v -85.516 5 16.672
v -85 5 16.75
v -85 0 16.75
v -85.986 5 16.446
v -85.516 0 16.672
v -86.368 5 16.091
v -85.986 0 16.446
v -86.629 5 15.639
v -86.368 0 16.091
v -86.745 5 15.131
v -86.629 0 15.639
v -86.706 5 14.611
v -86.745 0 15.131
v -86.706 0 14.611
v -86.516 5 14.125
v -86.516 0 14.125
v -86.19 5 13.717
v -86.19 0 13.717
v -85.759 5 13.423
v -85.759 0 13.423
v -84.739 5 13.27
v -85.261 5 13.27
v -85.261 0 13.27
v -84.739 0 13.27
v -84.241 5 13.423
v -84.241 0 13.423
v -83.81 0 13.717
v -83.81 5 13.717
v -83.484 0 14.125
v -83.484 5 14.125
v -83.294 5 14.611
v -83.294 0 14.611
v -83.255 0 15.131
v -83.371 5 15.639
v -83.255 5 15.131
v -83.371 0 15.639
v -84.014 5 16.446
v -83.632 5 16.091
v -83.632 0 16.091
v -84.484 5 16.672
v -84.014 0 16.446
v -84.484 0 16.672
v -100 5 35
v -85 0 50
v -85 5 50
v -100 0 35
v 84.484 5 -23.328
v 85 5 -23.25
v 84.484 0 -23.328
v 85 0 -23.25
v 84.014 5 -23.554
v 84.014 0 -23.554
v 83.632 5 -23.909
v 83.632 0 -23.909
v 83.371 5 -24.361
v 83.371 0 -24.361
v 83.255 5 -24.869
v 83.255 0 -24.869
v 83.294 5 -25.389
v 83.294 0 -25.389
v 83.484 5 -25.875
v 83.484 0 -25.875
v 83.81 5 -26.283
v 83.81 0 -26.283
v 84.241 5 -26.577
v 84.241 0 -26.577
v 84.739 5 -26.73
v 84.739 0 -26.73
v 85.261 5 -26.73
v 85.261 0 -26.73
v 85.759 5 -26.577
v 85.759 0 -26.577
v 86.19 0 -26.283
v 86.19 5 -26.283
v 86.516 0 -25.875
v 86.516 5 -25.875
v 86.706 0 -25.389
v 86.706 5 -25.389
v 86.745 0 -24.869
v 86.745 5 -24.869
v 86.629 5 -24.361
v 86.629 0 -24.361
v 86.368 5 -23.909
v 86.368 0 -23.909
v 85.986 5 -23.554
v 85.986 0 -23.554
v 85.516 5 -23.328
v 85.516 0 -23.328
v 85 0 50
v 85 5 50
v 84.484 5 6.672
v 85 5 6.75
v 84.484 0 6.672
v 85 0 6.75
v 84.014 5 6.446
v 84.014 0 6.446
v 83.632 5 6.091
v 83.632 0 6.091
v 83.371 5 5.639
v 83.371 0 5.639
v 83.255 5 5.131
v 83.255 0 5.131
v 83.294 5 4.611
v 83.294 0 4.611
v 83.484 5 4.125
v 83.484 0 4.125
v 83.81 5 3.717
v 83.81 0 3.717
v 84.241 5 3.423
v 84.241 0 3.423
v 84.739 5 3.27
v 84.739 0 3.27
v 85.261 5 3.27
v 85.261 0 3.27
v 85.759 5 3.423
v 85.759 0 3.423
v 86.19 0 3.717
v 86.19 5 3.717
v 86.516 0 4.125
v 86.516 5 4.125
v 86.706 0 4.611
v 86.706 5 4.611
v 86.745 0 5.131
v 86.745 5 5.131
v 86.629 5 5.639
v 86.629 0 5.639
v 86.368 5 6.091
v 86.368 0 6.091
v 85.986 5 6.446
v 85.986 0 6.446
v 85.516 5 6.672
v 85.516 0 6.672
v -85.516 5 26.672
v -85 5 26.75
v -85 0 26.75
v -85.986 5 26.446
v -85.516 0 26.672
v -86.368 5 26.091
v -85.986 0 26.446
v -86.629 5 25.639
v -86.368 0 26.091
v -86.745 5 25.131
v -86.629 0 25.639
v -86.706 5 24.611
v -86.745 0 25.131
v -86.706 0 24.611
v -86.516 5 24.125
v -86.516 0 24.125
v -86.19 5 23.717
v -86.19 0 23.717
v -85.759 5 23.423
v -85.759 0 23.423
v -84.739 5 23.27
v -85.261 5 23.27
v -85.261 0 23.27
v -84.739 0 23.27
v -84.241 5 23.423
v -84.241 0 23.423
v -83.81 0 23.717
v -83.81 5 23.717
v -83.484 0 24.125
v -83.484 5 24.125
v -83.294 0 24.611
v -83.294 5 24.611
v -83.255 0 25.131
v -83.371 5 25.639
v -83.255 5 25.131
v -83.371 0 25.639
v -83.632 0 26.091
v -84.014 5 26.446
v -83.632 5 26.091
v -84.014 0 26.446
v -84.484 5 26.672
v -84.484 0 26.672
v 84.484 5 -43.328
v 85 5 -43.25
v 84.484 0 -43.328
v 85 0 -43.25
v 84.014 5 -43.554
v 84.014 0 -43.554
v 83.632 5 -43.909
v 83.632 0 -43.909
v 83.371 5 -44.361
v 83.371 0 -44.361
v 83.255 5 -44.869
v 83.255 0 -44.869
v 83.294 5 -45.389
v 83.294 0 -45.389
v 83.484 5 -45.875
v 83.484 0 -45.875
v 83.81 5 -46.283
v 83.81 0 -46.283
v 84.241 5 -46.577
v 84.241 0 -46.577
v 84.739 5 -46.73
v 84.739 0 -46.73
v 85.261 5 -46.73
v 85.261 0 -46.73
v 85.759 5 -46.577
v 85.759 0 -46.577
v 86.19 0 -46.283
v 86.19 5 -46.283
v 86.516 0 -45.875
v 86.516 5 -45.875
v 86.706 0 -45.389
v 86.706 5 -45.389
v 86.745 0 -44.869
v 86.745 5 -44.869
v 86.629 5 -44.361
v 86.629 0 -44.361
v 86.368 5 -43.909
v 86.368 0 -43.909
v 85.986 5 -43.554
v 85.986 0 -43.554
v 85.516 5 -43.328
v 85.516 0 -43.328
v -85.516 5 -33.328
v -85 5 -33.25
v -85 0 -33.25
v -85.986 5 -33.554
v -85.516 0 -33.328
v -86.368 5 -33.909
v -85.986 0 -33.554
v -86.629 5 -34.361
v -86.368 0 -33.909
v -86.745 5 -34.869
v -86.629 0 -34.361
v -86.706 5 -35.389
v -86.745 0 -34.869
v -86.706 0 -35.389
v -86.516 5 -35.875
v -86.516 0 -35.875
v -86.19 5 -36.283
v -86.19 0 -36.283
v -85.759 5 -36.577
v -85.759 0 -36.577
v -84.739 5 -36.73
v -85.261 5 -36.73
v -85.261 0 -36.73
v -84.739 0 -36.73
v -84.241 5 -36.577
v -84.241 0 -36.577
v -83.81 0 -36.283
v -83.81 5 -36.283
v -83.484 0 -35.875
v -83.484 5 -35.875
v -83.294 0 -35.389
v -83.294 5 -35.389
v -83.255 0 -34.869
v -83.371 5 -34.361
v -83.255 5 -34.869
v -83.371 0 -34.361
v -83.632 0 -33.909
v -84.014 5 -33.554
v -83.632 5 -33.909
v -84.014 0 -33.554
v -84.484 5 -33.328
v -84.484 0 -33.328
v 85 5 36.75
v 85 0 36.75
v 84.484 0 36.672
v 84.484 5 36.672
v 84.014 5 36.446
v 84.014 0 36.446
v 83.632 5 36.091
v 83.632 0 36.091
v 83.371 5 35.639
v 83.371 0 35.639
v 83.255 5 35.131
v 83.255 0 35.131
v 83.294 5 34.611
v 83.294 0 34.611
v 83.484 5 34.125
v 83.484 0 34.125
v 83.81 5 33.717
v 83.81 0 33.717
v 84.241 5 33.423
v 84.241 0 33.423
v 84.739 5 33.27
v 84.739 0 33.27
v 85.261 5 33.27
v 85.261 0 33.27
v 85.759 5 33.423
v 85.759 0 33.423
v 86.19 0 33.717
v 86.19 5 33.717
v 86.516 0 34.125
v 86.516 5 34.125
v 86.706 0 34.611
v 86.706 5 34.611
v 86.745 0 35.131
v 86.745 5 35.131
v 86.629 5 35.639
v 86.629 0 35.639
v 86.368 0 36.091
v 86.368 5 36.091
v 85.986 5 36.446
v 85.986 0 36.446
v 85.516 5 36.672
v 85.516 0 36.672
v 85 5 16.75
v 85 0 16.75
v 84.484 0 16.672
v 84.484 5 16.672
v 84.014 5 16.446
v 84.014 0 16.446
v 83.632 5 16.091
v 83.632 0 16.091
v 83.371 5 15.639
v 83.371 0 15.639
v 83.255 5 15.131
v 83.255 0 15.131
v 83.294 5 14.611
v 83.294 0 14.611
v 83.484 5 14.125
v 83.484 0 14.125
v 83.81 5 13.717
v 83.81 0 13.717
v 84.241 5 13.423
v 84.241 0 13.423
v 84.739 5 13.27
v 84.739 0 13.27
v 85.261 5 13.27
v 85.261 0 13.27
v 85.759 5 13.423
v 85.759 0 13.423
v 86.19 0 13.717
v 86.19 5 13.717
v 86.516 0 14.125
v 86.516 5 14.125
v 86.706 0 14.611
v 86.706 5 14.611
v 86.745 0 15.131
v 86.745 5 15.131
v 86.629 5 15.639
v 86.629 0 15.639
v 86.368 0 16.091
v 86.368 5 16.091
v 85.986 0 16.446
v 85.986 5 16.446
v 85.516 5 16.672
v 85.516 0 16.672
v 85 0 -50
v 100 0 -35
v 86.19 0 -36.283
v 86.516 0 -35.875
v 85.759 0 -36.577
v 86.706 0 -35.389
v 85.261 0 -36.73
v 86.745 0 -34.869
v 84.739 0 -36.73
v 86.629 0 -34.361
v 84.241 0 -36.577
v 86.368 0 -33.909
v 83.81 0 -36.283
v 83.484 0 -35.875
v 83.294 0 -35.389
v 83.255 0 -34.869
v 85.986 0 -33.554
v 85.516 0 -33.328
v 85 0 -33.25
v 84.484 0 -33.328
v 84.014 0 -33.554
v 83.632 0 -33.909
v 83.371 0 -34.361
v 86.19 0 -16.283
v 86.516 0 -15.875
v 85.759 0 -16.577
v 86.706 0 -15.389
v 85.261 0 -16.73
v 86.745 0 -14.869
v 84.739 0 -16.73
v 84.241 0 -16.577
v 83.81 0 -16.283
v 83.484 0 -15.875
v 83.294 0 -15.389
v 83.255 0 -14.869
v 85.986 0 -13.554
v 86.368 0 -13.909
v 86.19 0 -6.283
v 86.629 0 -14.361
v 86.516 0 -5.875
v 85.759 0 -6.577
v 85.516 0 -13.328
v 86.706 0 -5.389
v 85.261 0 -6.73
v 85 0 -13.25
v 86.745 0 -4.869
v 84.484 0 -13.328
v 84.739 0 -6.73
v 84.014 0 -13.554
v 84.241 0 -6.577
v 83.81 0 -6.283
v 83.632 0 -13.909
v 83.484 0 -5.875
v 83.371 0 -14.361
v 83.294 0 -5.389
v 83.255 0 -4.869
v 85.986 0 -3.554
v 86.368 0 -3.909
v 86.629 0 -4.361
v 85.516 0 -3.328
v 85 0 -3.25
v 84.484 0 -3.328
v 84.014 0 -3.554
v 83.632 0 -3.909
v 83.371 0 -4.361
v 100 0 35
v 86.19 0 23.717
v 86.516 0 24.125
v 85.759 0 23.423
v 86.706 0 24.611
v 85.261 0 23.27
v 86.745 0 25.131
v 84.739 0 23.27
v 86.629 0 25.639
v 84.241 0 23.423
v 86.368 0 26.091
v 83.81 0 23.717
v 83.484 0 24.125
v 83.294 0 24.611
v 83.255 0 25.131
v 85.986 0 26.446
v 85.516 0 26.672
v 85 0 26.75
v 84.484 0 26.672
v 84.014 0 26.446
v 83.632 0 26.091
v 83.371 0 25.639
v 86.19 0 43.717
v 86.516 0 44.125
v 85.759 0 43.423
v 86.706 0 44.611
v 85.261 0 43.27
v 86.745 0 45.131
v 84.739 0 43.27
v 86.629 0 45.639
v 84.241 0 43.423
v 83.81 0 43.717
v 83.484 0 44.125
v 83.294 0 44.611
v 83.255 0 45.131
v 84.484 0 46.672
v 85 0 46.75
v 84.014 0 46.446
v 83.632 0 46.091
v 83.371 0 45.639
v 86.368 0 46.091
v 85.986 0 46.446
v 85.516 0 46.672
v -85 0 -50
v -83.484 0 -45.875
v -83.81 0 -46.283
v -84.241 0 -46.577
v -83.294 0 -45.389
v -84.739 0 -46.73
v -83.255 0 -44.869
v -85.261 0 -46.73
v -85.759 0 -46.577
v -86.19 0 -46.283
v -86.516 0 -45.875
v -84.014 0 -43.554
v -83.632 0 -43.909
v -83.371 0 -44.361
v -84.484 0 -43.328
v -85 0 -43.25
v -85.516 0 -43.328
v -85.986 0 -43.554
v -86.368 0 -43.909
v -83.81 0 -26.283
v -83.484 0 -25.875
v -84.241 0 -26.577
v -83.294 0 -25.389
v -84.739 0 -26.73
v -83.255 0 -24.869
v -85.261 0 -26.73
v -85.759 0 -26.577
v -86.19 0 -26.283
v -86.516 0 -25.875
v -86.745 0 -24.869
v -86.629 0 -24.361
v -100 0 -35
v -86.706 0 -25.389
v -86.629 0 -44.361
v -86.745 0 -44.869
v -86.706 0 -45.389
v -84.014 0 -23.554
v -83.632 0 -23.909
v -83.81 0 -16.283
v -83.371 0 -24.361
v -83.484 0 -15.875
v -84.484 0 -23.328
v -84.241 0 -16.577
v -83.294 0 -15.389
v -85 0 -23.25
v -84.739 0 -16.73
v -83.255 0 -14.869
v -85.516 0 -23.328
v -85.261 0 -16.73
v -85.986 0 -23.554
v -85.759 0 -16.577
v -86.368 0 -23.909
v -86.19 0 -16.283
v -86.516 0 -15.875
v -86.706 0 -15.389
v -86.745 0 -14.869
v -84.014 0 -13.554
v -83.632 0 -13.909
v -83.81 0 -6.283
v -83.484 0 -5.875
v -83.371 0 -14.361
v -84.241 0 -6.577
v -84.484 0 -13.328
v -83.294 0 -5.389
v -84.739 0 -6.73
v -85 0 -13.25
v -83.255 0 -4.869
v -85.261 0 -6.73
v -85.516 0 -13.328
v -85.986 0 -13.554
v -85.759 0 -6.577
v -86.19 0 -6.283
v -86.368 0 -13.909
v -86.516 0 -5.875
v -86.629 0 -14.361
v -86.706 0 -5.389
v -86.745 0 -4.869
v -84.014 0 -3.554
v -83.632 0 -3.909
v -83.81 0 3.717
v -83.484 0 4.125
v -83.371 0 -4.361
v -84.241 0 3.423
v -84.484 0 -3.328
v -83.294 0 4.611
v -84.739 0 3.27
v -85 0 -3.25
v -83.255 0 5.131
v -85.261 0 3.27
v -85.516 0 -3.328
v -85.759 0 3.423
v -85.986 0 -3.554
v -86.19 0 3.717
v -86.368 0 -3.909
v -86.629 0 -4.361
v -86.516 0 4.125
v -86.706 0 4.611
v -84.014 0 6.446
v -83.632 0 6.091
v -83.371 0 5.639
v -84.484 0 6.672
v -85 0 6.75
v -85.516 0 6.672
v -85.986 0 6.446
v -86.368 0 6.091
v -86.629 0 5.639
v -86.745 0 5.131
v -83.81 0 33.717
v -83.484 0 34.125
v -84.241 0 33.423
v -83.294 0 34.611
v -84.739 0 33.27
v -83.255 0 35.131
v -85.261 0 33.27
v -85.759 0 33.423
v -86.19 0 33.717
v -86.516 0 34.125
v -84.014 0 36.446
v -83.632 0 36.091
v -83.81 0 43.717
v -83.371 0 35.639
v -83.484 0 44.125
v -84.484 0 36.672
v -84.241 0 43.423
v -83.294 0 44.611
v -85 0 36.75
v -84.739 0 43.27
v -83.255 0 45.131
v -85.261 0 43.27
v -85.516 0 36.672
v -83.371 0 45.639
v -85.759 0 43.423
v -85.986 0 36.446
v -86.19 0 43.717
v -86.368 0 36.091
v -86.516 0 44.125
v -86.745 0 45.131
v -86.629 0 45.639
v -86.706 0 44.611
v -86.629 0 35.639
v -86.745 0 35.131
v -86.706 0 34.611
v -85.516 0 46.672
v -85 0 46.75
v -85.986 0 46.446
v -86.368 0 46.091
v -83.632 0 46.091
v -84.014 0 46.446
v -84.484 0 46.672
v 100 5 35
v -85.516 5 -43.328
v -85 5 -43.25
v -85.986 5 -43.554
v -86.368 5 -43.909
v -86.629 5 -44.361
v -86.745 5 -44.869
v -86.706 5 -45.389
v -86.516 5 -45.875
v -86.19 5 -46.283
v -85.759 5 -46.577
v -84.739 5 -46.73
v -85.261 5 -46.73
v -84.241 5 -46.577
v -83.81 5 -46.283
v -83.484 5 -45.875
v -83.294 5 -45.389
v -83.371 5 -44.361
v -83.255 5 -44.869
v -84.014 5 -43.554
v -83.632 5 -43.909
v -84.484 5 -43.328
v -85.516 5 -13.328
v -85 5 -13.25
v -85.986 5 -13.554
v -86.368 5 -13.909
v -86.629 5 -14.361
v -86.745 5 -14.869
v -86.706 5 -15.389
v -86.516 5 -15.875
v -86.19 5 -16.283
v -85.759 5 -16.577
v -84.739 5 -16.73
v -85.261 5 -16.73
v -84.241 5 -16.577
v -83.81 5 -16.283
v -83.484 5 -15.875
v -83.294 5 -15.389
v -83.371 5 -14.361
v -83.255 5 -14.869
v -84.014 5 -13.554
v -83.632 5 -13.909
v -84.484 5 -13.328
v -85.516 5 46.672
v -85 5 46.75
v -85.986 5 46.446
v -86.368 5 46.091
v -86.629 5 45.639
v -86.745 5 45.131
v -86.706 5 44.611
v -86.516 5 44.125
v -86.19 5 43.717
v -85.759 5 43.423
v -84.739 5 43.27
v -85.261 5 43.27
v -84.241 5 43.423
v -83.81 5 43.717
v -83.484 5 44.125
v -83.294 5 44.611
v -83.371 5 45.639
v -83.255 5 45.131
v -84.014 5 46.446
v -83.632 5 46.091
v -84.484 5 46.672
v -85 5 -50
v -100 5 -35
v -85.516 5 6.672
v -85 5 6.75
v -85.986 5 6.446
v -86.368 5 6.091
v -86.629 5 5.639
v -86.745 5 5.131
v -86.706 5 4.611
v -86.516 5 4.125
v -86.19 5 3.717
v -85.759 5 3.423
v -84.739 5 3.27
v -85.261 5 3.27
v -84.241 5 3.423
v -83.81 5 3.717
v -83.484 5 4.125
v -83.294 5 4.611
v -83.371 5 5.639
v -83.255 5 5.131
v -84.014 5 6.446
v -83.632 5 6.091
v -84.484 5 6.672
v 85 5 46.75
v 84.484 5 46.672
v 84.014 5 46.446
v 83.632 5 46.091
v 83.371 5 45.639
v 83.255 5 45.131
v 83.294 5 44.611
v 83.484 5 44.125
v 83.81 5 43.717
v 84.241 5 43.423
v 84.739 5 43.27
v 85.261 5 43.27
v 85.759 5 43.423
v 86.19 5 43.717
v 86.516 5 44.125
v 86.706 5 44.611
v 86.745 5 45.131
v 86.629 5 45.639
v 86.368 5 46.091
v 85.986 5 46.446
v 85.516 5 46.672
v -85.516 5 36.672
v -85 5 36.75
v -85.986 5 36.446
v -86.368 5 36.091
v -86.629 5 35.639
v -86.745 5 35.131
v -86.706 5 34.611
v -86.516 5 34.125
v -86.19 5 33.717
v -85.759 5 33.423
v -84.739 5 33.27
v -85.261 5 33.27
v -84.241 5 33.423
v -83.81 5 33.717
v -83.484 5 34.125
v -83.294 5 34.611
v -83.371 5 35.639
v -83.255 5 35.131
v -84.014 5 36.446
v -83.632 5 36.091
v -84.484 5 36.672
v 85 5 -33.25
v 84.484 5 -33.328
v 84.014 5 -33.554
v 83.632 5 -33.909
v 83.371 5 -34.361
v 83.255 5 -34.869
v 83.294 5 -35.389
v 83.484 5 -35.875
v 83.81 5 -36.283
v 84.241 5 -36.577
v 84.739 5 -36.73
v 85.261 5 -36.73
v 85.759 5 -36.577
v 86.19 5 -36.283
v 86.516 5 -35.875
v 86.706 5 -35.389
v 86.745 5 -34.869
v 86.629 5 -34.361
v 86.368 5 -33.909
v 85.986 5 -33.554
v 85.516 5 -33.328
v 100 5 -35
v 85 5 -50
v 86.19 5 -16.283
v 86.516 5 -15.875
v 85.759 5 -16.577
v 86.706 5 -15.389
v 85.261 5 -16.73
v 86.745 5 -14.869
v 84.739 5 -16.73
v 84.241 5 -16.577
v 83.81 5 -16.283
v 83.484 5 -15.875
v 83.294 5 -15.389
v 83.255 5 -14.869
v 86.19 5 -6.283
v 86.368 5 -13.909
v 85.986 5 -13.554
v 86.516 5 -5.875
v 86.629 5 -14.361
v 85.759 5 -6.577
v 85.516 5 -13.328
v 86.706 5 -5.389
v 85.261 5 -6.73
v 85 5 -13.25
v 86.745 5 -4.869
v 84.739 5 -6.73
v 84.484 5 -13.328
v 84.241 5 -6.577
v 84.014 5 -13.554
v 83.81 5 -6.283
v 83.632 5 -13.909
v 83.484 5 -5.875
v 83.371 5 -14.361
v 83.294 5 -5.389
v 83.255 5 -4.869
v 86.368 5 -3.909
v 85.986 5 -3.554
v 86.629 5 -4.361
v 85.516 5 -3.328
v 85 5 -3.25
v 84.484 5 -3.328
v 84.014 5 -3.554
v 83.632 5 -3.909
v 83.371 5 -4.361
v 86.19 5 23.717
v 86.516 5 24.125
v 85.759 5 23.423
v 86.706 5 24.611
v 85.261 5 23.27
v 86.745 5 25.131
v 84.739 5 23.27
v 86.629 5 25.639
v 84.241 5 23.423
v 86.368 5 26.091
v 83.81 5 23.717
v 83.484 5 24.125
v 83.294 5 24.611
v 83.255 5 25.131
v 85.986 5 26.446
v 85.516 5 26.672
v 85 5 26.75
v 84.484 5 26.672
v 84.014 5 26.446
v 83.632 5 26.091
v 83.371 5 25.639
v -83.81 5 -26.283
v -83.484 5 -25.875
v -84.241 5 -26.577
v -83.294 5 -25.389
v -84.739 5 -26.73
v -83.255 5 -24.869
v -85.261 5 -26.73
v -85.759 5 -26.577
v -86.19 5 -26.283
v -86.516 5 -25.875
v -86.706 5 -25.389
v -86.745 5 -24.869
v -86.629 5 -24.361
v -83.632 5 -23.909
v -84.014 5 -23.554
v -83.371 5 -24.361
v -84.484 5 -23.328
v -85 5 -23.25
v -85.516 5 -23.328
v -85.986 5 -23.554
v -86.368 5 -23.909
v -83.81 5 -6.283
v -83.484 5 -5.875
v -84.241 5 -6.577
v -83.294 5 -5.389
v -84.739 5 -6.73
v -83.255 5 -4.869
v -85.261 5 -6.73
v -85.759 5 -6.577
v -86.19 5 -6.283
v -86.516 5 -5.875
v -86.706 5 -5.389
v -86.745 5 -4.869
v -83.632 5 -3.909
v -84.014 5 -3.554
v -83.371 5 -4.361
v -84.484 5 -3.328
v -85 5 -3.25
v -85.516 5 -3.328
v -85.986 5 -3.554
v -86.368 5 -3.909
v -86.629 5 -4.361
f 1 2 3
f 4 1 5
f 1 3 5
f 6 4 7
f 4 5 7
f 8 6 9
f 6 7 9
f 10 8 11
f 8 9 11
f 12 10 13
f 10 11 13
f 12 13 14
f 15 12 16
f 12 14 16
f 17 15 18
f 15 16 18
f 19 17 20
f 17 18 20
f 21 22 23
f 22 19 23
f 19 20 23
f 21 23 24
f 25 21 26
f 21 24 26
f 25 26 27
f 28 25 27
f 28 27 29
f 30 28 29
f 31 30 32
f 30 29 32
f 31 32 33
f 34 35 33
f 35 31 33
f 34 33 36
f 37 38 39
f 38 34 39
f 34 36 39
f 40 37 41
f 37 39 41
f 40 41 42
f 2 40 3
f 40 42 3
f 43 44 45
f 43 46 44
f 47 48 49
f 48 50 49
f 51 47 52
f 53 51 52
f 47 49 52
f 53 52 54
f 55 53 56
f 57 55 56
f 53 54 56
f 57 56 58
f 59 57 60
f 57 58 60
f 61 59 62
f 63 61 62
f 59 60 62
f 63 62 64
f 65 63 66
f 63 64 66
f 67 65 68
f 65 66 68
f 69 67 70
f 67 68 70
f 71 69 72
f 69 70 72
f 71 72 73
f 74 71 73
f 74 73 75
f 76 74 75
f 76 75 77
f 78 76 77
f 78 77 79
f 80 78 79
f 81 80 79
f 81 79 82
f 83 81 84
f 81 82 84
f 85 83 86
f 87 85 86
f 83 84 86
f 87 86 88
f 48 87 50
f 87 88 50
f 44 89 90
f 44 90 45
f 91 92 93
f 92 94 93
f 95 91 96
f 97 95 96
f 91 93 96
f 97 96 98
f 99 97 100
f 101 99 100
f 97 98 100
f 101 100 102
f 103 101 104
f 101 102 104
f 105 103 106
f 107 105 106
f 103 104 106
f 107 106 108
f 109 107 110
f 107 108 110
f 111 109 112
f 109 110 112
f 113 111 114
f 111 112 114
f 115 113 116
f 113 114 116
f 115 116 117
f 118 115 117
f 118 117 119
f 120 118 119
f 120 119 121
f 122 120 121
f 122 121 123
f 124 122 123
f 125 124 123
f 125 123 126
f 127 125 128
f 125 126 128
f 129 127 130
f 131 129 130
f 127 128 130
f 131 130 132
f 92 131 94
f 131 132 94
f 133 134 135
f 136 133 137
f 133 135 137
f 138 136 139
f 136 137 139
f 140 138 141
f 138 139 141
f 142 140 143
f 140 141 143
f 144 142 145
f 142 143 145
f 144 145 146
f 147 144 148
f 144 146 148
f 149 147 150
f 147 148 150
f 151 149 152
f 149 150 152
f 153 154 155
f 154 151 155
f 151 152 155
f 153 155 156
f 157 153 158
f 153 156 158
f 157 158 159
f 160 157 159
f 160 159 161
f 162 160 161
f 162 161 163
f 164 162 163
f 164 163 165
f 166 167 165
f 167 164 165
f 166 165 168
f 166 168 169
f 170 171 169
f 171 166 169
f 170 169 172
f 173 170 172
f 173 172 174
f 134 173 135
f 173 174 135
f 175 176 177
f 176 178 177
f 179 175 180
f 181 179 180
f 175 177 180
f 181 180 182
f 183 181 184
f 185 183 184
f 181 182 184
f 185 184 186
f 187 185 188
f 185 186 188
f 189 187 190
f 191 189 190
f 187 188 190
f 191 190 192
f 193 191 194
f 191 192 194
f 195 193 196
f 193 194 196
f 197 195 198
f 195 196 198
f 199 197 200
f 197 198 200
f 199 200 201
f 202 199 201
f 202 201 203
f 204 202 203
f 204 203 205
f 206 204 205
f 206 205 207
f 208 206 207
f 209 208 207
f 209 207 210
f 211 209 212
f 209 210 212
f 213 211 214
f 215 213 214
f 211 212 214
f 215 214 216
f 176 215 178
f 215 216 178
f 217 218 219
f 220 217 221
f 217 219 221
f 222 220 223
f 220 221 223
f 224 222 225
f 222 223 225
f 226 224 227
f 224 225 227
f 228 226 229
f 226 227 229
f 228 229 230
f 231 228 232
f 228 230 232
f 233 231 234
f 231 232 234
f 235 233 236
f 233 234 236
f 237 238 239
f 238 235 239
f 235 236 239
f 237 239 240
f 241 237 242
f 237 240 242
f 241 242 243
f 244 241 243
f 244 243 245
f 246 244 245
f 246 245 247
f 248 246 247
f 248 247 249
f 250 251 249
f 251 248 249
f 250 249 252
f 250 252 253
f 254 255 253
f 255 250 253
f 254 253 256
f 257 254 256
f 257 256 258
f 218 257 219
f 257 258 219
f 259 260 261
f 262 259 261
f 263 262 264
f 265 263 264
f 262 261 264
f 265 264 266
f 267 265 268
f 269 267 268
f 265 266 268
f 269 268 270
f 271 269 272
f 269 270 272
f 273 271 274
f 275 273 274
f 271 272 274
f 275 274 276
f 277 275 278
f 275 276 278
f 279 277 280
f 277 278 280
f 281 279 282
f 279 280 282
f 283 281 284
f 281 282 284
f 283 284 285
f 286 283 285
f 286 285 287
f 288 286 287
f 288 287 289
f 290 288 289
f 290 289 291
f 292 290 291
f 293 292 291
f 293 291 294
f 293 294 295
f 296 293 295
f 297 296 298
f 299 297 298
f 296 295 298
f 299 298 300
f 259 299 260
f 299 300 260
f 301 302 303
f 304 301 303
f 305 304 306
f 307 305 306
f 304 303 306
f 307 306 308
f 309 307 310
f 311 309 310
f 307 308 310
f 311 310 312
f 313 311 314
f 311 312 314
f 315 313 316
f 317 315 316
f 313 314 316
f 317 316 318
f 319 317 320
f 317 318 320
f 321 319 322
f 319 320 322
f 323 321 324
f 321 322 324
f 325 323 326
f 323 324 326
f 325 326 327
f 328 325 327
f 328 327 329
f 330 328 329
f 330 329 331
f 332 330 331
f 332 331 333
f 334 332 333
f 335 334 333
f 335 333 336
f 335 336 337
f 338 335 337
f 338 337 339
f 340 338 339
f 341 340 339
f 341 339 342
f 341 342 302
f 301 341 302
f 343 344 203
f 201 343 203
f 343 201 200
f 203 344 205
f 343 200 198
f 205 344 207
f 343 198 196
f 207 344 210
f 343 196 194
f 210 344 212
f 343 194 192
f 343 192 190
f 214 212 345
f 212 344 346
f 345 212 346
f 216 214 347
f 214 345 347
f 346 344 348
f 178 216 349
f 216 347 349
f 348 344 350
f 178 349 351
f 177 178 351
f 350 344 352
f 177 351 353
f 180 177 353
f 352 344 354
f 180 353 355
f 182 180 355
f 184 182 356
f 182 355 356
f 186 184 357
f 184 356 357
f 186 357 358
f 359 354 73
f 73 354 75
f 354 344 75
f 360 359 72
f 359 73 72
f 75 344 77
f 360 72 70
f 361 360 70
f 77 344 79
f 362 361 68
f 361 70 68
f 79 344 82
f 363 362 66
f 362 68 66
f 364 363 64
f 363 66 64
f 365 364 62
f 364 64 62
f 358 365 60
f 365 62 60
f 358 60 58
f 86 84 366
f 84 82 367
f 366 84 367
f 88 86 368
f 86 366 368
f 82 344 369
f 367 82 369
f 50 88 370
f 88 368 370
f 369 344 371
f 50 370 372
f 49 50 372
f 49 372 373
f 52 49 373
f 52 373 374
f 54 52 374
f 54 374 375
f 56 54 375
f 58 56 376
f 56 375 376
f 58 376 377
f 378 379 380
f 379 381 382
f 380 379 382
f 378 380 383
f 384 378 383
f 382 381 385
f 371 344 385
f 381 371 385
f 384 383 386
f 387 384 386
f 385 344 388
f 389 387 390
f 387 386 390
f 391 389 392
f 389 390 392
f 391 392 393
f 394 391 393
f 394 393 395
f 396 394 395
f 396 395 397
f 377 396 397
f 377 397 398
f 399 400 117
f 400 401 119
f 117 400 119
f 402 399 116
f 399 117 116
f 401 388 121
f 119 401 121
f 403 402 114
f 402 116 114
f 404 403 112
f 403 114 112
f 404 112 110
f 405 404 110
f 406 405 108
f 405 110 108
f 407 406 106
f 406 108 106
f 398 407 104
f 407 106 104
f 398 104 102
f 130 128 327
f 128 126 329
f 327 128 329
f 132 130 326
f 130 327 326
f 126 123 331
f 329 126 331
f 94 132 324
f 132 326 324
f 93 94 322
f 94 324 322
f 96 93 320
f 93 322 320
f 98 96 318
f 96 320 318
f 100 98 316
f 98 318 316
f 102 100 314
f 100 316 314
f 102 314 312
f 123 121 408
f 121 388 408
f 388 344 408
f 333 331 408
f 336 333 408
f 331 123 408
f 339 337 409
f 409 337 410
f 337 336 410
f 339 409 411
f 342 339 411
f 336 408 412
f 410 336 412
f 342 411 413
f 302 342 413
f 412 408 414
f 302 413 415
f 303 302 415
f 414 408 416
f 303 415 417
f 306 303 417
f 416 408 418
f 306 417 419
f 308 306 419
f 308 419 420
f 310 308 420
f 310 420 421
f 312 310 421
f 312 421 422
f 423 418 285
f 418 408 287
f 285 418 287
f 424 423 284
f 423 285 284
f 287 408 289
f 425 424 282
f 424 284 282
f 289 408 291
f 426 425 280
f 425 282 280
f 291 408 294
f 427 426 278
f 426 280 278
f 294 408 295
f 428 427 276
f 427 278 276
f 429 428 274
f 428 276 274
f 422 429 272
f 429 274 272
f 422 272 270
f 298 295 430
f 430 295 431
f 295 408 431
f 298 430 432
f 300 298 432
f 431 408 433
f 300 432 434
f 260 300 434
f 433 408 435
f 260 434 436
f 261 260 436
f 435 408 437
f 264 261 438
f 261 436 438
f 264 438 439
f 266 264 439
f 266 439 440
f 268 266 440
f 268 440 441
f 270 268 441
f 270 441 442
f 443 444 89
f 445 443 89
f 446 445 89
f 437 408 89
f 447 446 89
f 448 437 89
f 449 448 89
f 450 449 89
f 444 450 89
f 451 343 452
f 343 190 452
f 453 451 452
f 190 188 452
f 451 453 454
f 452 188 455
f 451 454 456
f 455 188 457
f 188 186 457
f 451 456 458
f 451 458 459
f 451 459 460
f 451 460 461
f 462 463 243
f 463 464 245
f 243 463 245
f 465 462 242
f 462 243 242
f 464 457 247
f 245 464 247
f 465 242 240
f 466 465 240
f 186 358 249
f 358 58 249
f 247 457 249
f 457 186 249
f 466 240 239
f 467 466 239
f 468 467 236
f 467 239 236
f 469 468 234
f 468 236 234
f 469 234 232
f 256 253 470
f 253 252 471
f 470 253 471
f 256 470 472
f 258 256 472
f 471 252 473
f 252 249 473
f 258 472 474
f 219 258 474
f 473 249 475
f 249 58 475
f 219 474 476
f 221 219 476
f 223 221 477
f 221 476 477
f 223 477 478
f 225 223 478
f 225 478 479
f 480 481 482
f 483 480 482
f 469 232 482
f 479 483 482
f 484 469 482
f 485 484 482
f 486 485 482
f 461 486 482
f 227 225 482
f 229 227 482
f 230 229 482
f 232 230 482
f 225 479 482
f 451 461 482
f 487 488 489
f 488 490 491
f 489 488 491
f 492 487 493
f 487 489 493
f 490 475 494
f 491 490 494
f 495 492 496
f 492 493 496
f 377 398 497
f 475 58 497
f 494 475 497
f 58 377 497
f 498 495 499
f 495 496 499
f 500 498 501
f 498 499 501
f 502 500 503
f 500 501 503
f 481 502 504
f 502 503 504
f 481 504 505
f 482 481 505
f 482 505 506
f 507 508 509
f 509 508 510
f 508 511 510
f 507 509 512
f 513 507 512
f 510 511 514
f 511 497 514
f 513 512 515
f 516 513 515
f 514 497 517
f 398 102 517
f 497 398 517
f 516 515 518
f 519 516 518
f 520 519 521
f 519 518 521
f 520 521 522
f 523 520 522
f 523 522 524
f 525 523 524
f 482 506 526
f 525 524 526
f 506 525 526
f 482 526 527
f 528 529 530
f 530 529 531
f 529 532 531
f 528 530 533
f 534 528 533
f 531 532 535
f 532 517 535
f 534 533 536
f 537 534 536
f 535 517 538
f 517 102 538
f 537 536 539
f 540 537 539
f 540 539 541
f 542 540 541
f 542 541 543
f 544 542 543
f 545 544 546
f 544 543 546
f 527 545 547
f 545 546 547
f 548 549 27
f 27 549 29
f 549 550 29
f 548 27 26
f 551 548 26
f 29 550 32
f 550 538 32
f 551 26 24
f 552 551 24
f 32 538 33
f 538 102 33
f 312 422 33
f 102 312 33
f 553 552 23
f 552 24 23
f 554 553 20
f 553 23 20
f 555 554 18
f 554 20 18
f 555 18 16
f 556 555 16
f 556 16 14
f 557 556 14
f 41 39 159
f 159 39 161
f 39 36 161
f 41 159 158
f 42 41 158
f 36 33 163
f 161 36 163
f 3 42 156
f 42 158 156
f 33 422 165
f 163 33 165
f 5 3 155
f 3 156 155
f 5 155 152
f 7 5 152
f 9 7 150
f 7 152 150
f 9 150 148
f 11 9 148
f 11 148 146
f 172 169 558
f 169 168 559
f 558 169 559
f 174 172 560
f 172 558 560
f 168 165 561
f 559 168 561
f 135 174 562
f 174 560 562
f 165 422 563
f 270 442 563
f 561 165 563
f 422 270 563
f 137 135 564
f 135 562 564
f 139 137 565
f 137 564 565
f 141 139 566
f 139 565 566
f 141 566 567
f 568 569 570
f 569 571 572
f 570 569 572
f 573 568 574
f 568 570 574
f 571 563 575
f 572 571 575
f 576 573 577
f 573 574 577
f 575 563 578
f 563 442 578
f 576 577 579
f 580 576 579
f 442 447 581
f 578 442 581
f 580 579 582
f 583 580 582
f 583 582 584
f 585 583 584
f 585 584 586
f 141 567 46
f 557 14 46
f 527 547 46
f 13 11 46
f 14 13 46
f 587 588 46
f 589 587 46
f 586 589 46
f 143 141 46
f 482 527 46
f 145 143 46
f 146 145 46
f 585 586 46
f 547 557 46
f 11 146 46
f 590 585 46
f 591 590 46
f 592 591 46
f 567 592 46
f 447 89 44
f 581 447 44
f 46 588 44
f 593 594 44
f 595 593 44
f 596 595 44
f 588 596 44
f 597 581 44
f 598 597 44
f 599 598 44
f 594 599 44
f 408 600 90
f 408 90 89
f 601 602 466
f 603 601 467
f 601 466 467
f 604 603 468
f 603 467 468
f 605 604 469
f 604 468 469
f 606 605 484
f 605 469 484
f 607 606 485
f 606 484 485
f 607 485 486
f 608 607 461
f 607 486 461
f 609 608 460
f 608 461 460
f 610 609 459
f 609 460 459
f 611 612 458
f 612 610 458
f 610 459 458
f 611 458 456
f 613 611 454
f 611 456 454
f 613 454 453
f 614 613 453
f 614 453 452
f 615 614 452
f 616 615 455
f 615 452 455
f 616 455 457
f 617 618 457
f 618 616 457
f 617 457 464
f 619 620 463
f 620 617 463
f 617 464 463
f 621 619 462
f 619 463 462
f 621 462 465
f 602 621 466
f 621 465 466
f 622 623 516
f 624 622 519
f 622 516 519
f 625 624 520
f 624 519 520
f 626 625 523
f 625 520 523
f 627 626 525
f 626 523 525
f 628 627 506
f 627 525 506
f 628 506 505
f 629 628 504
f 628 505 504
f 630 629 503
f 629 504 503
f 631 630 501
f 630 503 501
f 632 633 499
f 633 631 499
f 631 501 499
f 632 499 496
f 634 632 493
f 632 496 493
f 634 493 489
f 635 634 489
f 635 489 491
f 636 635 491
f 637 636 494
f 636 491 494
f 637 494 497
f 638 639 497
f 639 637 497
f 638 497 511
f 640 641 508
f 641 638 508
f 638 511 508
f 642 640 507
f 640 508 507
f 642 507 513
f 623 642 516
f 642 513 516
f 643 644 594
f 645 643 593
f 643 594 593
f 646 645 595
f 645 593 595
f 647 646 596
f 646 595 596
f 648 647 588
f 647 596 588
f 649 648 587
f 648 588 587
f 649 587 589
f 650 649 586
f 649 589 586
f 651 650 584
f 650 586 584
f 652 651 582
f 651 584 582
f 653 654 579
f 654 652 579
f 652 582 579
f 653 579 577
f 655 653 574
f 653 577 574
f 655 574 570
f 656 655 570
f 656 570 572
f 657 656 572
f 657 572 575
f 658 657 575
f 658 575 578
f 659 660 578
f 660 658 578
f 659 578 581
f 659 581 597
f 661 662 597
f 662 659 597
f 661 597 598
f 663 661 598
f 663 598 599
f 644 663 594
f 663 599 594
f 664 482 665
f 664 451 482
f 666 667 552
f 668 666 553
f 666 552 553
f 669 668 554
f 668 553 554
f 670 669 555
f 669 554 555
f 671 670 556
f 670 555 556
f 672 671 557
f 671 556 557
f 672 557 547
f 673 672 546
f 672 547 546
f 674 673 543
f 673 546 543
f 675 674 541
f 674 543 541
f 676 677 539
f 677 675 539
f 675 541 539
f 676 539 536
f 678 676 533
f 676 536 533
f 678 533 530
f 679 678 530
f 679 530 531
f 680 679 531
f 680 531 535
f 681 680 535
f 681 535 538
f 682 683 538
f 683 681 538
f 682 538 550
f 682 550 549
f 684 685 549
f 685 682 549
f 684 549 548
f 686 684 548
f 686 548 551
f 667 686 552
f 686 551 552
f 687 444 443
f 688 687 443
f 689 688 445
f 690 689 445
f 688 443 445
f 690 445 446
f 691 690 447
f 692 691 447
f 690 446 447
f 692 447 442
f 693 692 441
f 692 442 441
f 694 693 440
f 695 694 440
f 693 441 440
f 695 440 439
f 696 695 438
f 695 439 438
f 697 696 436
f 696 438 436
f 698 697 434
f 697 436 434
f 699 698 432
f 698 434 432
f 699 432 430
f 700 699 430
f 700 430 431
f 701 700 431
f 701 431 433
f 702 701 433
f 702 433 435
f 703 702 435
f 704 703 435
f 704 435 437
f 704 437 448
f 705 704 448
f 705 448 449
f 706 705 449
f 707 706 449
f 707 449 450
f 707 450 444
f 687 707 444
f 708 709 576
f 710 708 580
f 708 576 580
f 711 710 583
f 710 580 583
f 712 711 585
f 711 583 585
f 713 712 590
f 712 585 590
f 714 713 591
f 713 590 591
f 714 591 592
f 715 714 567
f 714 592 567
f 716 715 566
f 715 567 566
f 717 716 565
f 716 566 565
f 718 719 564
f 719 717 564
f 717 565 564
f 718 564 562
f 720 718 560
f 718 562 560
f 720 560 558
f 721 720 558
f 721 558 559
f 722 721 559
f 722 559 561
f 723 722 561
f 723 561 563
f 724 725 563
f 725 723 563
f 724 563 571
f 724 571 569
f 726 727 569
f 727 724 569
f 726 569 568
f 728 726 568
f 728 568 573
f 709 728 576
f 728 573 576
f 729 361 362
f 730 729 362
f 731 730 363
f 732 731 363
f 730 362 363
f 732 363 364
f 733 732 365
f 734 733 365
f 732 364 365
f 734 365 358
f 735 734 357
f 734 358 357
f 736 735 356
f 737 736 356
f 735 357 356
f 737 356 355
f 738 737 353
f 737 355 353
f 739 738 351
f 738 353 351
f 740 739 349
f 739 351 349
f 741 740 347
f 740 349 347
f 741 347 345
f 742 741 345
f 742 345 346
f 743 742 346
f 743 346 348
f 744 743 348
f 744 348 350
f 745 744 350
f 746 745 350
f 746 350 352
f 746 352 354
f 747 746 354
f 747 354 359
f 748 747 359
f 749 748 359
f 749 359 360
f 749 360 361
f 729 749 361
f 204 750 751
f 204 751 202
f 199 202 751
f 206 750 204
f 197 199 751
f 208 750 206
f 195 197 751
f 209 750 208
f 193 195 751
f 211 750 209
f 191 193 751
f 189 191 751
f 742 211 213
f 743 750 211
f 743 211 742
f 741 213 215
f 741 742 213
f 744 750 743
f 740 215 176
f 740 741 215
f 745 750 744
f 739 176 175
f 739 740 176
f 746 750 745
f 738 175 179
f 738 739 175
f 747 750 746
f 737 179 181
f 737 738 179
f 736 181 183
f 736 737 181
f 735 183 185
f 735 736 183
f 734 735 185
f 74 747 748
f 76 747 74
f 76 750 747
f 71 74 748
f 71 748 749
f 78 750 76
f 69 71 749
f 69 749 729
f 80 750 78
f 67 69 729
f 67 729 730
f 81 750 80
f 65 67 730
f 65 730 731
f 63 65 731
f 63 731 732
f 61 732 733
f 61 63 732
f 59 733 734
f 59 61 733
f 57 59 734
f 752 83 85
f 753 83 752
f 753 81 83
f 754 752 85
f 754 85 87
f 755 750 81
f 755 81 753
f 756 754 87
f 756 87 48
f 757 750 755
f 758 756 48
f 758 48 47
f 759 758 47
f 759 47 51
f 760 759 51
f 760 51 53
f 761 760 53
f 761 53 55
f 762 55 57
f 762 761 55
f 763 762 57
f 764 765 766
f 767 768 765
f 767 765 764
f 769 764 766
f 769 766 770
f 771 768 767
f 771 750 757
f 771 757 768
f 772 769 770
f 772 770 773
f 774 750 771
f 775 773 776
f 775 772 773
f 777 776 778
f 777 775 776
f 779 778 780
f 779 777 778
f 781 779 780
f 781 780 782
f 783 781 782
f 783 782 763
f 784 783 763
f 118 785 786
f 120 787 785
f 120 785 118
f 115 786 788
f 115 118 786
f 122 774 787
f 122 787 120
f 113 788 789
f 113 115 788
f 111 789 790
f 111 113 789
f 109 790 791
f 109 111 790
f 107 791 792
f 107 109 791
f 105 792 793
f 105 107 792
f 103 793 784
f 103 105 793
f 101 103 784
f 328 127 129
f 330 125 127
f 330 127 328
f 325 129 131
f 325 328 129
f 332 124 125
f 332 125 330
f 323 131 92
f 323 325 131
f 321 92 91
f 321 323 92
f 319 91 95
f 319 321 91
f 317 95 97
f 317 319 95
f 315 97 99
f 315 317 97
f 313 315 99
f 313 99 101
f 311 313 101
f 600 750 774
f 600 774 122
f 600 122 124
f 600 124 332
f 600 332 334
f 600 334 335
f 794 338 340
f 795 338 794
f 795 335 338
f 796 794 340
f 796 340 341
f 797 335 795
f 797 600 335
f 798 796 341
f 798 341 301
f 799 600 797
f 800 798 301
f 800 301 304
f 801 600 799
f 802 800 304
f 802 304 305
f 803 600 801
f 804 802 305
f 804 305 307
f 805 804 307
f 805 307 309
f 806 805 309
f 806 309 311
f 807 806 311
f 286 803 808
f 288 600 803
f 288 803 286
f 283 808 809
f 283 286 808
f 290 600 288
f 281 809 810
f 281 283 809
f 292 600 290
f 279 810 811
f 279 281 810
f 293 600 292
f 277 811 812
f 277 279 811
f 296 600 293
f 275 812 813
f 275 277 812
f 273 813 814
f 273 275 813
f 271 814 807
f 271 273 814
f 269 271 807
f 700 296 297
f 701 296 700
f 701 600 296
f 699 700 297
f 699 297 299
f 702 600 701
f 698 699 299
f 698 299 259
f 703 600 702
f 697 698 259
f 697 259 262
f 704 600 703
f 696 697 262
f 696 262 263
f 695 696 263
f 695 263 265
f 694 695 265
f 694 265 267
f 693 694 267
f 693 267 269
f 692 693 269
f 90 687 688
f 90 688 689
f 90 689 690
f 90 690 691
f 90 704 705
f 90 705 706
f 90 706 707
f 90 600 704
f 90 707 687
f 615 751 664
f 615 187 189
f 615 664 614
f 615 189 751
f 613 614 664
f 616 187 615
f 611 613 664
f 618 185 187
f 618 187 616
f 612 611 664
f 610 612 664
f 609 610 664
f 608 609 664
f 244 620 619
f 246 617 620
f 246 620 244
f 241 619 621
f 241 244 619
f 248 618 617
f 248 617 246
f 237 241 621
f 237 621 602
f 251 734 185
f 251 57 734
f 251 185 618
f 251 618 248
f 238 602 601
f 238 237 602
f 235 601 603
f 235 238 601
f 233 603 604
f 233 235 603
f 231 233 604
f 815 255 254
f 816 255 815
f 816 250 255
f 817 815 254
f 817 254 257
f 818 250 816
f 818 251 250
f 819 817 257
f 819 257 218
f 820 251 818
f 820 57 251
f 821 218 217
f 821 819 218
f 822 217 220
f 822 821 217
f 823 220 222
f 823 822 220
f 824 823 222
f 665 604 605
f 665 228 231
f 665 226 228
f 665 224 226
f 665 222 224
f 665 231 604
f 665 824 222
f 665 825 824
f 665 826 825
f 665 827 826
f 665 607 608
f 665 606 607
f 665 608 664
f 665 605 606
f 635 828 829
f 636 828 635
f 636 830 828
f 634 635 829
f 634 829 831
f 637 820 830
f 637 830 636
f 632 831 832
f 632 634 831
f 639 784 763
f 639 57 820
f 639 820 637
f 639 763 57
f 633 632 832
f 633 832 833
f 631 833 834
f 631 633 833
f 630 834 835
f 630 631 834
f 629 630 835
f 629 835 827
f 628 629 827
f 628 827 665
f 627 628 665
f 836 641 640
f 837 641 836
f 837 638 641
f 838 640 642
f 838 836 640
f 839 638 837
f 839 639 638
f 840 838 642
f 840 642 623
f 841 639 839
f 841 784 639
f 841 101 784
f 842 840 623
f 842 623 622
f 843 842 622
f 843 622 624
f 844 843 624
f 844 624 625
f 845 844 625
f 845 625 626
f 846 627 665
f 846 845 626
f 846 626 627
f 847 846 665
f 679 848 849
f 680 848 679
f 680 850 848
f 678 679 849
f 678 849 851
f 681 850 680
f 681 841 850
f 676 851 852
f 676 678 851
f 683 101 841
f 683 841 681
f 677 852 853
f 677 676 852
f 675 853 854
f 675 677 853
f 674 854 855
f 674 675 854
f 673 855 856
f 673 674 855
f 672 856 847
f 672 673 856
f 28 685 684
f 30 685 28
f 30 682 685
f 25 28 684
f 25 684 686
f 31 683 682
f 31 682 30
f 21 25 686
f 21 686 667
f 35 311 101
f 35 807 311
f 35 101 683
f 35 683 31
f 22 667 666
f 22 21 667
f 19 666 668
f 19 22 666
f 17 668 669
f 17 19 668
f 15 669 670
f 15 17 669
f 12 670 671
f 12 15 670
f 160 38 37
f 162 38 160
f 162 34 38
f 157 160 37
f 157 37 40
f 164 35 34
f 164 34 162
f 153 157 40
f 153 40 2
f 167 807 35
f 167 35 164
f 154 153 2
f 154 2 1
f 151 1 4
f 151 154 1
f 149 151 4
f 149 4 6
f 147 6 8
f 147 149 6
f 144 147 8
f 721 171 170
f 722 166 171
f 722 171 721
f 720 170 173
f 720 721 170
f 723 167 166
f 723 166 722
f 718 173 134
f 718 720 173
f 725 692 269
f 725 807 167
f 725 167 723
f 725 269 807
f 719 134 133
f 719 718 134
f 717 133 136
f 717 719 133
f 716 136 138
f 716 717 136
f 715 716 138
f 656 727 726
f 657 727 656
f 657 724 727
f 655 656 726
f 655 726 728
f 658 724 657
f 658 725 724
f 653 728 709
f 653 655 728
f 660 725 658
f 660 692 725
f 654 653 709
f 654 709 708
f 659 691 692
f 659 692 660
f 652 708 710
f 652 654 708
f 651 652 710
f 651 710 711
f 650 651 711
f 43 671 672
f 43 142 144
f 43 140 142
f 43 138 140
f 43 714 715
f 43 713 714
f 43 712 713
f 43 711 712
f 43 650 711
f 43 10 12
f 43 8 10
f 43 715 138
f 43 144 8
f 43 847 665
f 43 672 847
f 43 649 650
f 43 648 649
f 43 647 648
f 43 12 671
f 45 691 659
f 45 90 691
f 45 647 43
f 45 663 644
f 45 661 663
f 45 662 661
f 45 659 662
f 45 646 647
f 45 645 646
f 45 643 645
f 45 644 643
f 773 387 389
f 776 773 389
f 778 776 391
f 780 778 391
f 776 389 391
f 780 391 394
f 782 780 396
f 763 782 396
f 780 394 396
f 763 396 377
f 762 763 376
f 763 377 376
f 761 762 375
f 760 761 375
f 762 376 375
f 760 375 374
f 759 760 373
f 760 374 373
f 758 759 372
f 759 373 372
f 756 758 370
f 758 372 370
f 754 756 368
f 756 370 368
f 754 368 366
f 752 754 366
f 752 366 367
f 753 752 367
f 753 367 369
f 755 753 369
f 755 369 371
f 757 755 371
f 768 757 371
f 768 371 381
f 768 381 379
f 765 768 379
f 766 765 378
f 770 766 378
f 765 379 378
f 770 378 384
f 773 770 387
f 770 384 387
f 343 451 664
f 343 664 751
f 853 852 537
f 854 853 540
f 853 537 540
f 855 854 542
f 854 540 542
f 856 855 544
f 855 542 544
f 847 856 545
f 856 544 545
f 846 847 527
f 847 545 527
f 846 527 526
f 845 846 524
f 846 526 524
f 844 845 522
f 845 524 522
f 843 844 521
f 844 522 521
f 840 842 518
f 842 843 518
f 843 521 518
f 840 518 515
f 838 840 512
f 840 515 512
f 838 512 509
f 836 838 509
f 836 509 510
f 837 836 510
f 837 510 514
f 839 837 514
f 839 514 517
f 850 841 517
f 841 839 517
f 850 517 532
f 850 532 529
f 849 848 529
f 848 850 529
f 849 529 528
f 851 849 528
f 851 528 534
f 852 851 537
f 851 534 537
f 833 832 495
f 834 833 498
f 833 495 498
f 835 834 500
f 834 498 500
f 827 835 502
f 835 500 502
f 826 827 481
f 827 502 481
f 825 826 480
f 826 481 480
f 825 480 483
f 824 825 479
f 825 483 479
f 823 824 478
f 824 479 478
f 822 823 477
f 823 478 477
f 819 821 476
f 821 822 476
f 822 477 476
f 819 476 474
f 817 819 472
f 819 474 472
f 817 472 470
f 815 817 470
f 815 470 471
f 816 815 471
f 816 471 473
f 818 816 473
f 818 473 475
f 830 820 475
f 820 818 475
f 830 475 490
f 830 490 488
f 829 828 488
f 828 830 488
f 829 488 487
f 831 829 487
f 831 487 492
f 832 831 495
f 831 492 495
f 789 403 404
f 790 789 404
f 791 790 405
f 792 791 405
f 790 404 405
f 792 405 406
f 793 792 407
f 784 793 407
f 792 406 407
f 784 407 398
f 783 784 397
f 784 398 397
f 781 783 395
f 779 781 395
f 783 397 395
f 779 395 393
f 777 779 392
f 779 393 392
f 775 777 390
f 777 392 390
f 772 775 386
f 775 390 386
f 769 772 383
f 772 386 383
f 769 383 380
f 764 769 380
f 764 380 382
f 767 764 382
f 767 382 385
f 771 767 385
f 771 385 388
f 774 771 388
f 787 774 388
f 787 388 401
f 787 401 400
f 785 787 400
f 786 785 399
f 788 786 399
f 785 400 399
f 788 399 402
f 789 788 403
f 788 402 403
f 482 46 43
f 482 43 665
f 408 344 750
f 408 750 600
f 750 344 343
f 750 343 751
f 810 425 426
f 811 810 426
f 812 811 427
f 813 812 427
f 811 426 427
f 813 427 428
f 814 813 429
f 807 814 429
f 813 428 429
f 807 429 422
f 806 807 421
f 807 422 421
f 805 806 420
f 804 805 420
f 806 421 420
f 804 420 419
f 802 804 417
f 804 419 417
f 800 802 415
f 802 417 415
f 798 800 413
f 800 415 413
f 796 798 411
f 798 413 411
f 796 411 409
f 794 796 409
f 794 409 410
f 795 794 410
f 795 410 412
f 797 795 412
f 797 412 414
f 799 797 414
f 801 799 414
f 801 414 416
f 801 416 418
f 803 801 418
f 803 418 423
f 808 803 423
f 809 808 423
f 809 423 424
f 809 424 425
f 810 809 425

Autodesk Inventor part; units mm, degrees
ref_plane "YZ Plane" through (0, 0, 0) normal (1, 0, 0) x (0, 1, 0)
ref_plane "XZ Plane" through (0, 0, 0) normal (0, 1, 0) x (-1, 0, 0)
ref_plane "XY Plane" through (0, 0, 0) normal (0, 0, 1) x (1, 0, 0)
sketch "Sketch1" plane through (0, 0, 0) normal (0, 1, 0) x (-1, 0, 0)
  line L0 (-100, 50) -> (100, 50)
  line L1 (100, 50) -> (100, -50)
  line L2 (100, -50) -> (-100, -50)
  line L3 (-100, -50) -> (-100, 50)
  line L4 (-100, 50) -> (100, -50) construction
  line L5 (100, 50) -> (-100, -50) construction
  point P0 (0, 0)
  dimension "d0" = 200
  dimension "d1" = 100
extrude "Extrusion1" add sketch "Sketch1" along normal blind 5
chamfer "Chamfer1" distance 15 angle 45 4 edges at (100, 2.5, -50) (100, 2.5, 50) (-100, 2.5, 50) (-100, 2.5, -50)
sketch "Sketch2" plane through (0, 5, 0) normal (0, 1, 0) x (1, 0, 0)
  line L0 (-85, -50) -> (85, -50) projected
  line L1 (85, 50) -> (85, -50)
  line L2 (85, 0) -> (0, 0)
  line L3 (85, 50) -> (-85, 50) projected
  line L4 (85, 0) -> (75, 0)
  line L5 (75, 0) -> (75, 50)
  line L6 (85, -50) -> (85, -45)
  line L7 (85, -45) -> (87.1749, -45)
  dimension "d7" = 10
  dimension "d15" = 5
hole "Hole2" at (85, 5, 45) direction (0, -1, 0) diameter 3.5 depth 12
pattern_linear "Rectangular Pattern1" count 10 spacing 10 along (0, 0, -1) of "Hole2"
mirror "Mirror1" about plane through (0, 0, 0) normal (1, 0, 0) of "Hole2", "Rectangular Pattern1"
properties part number "Chasis2"
